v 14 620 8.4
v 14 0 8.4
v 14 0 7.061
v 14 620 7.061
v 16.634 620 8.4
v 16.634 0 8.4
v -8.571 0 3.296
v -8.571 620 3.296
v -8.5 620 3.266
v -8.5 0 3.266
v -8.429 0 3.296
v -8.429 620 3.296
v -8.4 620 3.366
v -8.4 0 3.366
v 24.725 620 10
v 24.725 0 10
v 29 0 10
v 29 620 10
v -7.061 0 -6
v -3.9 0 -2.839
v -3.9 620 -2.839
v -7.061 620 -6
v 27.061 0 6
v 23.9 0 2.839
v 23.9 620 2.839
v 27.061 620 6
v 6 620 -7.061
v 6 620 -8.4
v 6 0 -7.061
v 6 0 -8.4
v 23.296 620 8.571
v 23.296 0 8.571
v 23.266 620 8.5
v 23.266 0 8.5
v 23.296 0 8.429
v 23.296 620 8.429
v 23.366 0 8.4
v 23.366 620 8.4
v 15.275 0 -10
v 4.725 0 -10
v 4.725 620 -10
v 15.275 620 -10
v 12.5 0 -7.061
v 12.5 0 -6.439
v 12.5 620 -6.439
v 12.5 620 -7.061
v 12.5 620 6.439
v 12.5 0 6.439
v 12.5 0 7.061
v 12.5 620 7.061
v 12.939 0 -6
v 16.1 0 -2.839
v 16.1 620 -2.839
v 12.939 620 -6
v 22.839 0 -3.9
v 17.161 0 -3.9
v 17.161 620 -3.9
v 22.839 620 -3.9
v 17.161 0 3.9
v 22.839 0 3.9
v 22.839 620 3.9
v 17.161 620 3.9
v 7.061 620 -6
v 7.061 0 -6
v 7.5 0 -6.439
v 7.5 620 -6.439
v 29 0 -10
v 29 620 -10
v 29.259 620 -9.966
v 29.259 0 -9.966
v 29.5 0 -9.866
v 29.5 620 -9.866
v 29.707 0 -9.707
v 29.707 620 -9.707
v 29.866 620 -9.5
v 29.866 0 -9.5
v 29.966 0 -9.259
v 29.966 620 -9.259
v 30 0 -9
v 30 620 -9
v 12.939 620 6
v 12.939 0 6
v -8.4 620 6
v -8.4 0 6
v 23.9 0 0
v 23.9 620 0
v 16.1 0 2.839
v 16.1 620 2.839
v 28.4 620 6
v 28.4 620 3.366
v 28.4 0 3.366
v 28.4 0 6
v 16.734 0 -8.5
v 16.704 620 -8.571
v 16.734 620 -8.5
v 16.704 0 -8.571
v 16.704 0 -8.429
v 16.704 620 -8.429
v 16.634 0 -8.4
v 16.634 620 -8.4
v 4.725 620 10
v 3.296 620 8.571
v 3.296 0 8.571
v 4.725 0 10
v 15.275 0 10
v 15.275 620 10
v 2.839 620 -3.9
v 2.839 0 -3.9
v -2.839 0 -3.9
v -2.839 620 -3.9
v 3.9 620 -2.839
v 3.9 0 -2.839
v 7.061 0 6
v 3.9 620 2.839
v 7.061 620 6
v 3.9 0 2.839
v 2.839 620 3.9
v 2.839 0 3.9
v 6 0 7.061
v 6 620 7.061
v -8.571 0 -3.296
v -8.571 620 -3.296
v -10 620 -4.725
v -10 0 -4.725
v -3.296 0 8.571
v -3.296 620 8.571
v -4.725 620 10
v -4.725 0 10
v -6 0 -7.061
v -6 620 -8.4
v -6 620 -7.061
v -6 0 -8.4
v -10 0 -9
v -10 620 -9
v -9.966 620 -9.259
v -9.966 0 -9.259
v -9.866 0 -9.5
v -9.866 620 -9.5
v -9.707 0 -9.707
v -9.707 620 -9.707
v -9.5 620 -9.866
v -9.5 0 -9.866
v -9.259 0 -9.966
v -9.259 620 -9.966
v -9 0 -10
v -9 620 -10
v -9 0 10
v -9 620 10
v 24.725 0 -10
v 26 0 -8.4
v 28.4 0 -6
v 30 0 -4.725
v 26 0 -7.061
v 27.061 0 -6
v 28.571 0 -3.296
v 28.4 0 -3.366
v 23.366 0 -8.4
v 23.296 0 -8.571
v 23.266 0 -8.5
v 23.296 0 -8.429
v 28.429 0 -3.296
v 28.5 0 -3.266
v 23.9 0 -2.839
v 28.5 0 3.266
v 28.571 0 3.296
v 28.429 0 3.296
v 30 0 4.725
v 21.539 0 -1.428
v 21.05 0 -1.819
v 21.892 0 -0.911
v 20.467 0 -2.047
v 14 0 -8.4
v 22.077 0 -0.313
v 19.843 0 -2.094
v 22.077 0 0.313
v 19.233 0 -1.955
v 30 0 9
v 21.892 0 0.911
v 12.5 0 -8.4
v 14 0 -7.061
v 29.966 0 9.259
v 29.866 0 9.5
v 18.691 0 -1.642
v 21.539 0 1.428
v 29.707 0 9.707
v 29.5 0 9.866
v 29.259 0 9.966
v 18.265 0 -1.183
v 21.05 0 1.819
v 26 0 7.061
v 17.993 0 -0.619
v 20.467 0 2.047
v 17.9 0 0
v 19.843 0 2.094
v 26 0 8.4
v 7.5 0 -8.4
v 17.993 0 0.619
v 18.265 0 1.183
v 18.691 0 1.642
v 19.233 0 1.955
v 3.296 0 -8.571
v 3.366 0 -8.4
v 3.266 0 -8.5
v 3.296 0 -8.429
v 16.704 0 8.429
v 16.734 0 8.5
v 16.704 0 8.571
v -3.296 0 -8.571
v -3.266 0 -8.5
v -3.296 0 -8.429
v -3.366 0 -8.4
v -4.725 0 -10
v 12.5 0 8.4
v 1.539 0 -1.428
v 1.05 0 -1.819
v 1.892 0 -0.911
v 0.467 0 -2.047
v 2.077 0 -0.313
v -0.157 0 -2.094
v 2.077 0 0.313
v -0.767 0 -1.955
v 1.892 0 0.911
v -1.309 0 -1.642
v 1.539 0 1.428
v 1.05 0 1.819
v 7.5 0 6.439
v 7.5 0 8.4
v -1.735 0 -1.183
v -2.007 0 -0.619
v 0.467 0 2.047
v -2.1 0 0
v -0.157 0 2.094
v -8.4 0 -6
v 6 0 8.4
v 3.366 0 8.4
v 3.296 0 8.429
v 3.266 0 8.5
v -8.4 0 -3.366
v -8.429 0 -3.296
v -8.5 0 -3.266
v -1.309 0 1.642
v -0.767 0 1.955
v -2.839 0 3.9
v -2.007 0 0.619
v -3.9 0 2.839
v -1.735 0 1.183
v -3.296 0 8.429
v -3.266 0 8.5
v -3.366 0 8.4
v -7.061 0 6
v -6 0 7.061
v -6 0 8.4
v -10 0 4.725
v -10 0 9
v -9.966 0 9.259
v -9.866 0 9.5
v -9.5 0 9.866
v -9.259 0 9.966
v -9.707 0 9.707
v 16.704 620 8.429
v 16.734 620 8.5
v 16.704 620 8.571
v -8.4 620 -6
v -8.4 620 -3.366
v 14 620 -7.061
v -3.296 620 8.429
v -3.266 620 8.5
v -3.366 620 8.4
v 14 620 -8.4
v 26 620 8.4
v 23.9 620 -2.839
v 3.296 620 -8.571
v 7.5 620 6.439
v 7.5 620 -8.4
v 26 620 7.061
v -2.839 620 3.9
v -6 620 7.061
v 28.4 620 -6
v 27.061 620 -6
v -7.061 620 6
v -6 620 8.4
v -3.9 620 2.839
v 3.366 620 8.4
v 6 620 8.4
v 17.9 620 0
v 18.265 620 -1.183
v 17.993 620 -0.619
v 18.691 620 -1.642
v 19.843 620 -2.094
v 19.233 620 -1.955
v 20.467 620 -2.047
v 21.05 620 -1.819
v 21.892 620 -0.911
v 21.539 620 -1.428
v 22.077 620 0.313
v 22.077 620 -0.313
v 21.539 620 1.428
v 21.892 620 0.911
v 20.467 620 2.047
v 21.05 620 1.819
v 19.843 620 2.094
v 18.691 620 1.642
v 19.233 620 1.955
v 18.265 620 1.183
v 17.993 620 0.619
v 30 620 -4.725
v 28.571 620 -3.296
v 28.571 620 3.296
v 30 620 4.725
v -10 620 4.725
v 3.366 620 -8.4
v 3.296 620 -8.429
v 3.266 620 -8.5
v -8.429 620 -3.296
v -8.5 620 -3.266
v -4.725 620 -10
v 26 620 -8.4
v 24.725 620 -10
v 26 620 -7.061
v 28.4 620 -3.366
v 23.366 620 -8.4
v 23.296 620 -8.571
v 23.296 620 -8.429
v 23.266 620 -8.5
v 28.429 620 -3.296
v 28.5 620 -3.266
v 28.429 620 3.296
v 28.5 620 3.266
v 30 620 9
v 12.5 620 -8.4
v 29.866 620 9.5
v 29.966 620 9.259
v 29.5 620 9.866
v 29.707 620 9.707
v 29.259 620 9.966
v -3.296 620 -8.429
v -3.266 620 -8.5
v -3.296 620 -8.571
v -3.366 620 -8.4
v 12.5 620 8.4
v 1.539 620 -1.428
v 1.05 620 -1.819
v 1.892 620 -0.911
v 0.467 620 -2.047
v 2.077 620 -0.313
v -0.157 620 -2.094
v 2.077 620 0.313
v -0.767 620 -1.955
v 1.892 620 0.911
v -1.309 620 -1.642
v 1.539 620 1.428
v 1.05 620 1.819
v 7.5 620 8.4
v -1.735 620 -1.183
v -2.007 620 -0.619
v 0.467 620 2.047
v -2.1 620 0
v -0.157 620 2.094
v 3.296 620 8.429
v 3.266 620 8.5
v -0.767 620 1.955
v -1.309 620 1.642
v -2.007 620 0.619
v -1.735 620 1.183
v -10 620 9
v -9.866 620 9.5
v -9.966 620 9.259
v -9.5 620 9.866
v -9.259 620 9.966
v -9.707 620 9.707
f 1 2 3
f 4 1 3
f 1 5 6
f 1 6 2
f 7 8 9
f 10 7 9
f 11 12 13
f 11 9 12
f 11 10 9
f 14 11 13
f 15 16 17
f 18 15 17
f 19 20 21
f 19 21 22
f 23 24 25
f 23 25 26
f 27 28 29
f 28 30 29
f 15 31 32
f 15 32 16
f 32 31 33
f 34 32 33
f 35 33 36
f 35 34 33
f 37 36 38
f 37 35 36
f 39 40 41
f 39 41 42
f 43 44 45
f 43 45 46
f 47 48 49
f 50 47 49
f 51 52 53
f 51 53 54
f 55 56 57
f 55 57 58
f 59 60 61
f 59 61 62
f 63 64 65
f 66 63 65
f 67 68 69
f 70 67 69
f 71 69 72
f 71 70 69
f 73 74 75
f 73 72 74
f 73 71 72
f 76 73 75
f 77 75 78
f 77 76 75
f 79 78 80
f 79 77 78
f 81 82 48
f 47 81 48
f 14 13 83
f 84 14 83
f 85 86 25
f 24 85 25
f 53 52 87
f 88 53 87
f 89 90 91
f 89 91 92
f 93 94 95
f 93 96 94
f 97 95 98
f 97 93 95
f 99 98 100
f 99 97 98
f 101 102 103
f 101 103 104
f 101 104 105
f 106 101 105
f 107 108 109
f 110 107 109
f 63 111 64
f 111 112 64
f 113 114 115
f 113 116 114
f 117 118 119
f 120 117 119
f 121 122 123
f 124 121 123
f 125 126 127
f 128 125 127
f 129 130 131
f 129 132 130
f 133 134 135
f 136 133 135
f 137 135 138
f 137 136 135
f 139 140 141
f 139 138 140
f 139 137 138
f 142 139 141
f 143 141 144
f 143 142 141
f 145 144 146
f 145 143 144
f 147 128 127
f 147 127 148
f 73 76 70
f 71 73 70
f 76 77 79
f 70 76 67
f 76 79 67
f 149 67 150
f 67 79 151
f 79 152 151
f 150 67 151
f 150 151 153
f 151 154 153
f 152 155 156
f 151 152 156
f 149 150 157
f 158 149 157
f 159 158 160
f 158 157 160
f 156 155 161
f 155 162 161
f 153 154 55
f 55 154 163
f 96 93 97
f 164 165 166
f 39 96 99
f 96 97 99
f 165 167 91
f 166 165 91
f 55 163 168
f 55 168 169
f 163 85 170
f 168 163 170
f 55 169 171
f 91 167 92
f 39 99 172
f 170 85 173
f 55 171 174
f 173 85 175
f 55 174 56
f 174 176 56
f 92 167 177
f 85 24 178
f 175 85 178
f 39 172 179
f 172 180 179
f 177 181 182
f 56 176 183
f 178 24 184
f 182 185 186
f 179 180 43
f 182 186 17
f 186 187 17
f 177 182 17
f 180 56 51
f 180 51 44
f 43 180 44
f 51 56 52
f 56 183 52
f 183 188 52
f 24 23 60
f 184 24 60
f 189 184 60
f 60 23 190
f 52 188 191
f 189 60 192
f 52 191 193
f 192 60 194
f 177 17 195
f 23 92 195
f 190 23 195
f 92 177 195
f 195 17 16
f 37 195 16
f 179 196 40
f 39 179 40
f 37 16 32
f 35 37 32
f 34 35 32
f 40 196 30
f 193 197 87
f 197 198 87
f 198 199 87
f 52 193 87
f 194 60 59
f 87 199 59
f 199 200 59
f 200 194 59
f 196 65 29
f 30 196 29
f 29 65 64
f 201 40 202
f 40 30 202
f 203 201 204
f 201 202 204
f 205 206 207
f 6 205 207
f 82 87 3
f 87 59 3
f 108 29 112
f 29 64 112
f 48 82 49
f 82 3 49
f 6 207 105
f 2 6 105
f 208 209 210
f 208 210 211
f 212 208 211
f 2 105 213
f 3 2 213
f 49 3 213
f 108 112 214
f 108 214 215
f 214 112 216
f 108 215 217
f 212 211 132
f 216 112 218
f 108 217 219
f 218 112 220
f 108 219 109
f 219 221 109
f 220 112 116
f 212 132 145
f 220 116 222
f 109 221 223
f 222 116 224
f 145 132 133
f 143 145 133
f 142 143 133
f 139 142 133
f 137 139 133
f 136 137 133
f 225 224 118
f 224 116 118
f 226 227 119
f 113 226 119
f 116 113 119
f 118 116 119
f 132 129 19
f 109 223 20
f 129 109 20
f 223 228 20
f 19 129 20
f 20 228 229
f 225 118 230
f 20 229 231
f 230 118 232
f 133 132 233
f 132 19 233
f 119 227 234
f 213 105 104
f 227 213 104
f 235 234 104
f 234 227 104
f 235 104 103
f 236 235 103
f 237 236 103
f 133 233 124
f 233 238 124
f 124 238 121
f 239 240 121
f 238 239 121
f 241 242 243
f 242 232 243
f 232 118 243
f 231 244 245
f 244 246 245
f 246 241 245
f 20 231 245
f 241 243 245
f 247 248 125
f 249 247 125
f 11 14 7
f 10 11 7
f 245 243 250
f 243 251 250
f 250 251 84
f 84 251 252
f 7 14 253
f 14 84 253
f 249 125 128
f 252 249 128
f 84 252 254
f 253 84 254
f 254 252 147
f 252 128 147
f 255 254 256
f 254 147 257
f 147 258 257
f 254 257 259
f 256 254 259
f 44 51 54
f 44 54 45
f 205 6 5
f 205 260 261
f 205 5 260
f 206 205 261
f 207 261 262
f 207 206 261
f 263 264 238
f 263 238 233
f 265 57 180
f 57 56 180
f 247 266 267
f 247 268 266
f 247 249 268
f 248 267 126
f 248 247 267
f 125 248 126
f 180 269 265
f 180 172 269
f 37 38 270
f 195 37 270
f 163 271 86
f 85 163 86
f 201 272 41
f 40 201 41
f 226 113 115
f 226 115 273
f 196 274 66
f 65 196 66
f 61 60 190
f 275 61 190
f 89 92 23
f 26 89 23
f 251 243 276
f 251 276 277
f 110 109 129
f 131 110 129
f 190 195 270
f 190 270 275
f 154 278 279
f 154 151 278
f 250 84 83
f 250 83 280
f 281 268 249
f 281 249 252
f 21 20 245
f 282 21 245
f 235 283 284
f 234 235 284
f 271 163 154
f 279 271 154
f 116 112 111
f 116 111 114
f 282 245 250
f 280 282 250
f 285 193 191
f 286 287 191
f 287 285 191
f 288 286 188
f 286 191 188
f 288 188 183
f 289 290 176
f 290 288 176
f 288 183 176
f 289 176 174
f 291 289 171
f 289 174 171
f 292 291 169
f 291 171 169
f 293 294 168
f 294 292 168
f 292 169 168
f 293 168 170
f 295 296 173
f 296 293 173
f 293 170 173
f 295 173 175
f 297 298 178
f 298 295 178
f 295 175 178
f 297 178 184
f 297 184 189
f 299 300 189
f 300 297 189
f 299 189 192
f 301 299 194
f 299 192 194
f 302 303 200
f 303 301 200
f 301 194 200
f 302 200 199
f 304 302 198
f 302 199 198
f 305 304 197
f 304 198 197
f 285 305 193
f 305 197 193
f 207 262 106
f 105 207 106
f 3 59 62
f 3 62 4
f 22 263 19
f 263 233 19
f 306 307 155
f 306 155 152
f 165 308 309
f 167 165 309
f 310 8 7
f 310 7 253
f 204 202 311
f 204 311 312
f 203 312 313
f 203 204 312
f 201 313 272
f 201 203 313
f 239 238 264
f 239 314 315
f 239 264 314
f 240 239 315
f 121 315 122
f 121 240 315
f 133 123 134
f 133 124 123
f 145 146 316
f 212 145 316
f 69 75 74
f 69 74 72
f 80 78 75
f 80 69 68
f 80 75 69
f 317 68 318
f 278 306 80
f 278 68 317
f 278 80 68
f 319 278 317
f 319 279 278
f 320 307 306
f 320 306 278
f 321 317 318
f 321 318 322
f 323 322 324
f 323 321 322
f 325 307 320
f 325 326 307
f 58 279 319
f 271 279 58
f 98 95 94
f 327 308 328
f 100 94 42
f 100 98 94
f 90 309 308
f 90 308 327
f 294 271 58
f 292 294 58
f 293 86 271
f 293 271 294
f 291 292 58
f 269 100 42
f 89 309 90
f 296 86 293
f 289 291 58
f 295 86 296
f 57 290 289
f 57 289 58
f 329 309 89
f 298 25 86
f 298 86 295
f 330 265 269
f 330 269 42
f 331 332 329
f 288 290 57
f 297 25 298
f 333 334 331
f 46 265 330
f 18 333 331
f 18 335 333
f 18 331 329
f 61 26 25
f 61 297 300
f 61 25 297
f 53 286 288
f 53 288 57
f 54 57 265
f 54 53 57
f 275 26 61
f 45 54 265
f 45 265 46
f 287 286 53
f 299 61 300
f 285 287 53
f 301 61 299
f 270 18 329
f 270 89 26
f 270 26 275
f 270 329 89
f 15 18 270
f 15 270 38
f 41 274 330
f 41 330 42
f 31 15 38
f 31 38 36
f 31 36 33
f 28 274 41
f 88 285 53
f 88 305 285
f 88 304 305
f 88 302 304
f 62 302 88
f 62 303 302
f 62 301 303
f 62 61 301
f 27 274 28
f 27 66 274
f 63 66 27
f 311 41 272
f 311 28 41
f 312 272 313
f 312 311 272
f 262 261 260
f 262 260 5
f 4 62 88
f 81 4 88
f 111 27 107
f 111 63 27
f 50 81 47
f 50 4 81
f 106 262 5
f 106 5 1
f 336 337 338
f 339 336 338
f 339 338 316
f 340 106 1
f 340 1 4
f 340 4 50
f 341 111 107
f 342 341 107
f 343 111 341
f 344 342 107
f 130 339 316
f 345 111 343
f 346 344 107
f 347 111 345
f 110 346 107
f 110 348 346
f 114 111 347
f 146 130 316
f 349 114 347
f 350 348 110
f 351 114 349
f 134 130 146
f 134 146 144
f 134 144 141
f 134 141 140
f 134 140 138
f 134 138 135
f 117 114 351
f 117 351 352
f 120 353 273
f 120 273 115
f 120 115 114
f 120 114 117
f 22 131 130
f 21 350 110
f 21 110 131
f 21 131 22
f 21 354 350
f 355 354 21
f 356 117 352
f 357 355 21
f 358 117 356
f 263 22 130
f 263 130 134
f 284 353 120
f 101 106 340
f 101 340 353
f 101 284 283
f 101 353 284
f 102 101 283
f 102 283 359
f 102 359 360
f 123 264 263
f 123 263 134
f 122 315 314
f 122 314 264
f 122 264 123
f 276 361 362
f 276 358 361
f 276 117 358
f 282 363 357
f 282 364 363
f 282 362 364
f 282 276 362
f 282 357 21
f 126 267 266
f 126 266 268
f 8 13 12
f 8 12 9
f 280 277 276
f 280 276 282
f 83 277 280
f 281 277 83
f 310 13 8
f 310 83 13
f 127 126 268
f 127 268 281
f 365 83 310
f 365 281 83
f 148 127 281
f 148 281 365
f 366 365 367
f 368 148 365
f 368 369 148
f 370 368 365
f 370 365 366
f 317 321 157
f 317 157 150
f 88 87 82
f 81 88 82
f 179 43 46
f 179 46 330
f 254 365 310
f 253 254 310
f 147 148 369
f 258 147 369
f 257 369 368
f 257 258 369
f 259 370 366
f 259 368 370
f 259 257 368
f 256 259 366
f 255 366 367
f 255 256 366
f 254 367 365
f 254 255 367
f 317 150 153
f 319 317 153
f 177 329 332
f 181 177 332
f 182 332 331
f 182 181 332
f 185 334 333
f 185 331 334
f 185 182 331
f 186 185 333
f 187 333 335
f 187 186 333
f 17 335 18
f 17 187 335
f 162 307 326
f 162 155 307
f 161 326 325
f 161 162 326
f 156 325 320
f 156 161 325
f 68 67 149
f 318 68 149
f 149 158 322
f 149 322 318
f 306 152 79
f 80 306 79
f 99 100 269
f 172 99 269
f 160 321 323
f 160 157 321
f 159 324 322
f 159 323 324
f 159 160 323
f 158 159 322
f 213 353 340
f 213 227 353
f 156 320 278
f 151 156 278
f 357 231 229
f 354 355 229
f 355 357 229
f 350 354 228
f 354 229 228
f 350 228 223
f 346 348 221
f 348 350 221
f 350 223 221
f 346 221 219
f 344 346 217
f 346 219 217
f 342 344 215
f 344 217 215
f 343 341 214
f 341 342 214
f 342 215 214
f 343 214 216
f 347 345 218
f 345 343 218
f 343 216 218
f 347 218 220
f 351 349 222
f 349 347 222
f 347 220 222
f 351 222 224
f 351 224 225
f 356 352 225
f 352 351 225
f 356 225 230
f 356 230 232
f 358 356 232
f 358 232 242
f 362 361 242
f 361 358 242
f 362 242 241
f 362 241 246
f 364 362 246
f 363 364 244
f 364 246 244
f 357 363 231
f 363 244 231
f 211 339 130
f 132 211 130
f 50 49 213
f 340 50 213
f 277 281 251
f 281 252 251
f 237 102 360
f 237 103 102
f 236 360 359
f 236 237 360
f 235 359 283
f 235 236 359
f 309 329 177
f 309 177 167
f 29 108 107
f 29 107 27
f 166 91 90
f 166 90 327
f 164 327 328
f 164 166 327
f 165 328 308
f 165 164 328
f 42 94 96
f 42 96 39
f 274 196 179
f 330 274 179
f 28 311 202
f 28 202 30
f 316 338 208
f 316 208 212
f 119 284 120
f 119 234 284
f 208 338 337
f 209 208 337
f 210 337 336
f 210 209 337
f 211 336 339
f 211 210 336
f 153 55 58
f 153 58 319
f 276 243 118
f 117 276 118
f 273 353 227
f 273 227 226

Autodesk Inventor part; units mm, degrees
ref_plane "YZ Plane" through (0, 0, 0) normal (1, 0, 0) x (0, 1, 0)
ref_plane "XZ Plane" through (0, 0, 0) normal (0, 1, 0) x (-1, 0, 0)
ref_plane "XY Plane" through (0, 0, 0) normal (0, 0, 1) x (1, 0, 0)
sketch "Sketch1" plane through (0, 0, 0) normal (0, 1, 0) x (-1, 0, 0)
  line L0 (3.9, -2.8393) -> (3.9, 2.8393)
  line L1 (2.8393, 3.9) -> (-2.8393, 3.9)
  line L2 (-2.8393, -3.9) -> (2.8393, -3.9)
  line L3 (8.5707, 3.2957) -> (10, 4.725)
  line L4 (8.5707, -3.2957) -> (10, -4.725)
  line L5 (8.4, 3.3664) -> (8.4, 6)
  line L6 (8.4, 6) -> (7.0607, 6)
  line L7 (10, 9) -> (10, 4.725)
  line L8 (10, -4.725) -> (10, -9)
  line L9 (3.9, 2.8393) -> (7.0607, 6)
  line L10 (3.2957, 8.5707) -> (4.725, 10)
  line L11 (3.3664, 8.4) -> (6, 8.4)
  line L12 (6, 8.4) -> (6, 7.0607)
  line L13 (2.8393, 3.9) -> (6, 7.0607)
  line L14 (8.4, -3.3664) -> (8.4, -6)
  line L15 (8.4, -6) -> (7.0607, -6)
  line L16 (3.9, -2.8393) -> (7.0607, -6)
  line L17 (3.2957, -8.5707) -> (4.725, -10)
  line L18 (3.3664, -8.4) -> (6, -8.4)
  line L19 (6, -8.4) -> (6, -7.0607)
  line L20 (2.8393, -3.9) -> (6, -7.0607)
  line L21 (-3.9, -2.8393) -> (-3.9, 2.8393)
  line L22 (-3.9, 2.8393) -> (-7.0607, 6)
  line L23 (-6, 8.4) -> (-6, 7.0607)
  line L24 (-2.8393, 3.9) -> (-6, 7.0607)
  line L25 (-3.9, -2.8393) -> (-7.0607, -6)
  line L26 (-2.8393, -3.9) -> (-6, -7.0607)
  line L27 (-6, -8.4) -> (-6, -7.0607)
  line L28 (-3.3664, -8.4) -> (-6, -8.4)
  line L29 (-3.2957, -8.5707) -> (-4.725, -10)
  line L30 (4.725, 10) -> (9, 10)
  line L31 (9, -10) -> (4.725, -10)
  circle A0 centre (0, 0) radius 2.1
  arc A1 (10, 9) -> (9, 10) centre (9, 9) ccw
  arc A2 (9, -10) -> (10, -9) centre (9, -9) ccw
  arc A3 (8.4, 3.3664) -> (8.5707, 3.2957) centre (8.5, 3.3664) ccw
  arc A4 (3.2957, 8.5707) -> (3.3664, 8.4) centre (3.3664, 8.5) ccw
  arc A5 (8.5707, -3.2957) -> (8.4, -3.3664) centre (8.5, -3.3664) ccw
  arc A6 (3.3664, -8.4) -> (3.2957, -8.5707) centre (3.3664, -8.5) ccw
  arc A7 (-3.2957, -8.5707) -> (-3.3664, -8.4) centre (-3.3664, -8.5) ccw
  line L32 (-23.9, -2.8393) -> (-23.9, 2.8393)
  line L33 (-22.8393, 3.9) -> (-17.1607, 3.9)
  line L34 (-17.1607, -3.9) -> (-22.8393, -3.9)
  line L35 (-28.5707, 3.2957) -> (-30, 4.725)
  line L36 (-28.5707, -3.2957) -> (-30, -4.725)
  line L37 (-28.4, 3.3664) -> (-28.4, 6)
  line L38 (-28.4, 6) -> (-27.0607, 6)
  line L39 (-30, 9) -> (-30, 4.725)
  line L40 (-30, -4.725) -> (-30, -9)
  line L41 (-23.9, 2.8393) -> (-27.0607, 6)
  line L42 (-23.2957, 8.5707) -> (-24.725, 10)
  line L43 (-23.3664, 8.4) -> (-26, 8.4)
  line L44 (-26, 8.4) -> (-26, 7.0607)
  line L45 (-22.8393, 3.9) -> (-26, 7.0607)
  line L46 (-23.9, 0) -> (-28.4, 0)
  line L47 (-23.9, -2.8393) -> (-27.0607, -6)
  line L48 (-28.4, -6) -> (-27.0607, -6)
  line L49 (-28.4, -3.3664) -> (-28.4, -6)
  line L50 (-22.8393, -3.9) -> (-26, -7.0607)
  line L51 (-26, -8.4) -> (-26, -7.0607)
  line L52 (-23.3664, -8.4) -> (-26, -8.4)
  line L53 (-23.2957, -8.5707) -> (-24.725, -10)
  line L54 (-16.1, -2.8393) -> (-12.9393, -6)
  line L55 (-17.1607, -3.9) -> (-14, -7.0607)
  line L56 (-16.6336, -8.4) -> (-14, -8.4)
  line L57 (-16.1, -2.8393) -> (-16.1, 2.8393)
  line L58 (-16.1, 2.8393) -> (-12.9393, 6)
  line L59 (-17.1607, 3.9) -> (-14, 7.0607)
  line L60 (-14, 8.4) -> (-14, 7.0607)
  line L61 (-14, -8.4) -> (-14, -7.0607)
  line L62 (-16.7043, -8.5707) -> (-15.275, -10)
  line L63 (-24.725, 10) -> (-29, 10)
  line L64 (-29, -10) -> (-24.725, -10)
  circle A8 centre (-20, 0) radius 2.1
  arc A9 (-29, 10) -> (-30, 9) centre (-29, 9) ccw
  arc A10 (-30, -9) -> (-29, -10) centre (-29, -9) ccw
  arc A11 (-28.5707, 3.2957) -> (-28.4, 3.3664) centre (-28.5, 3.3664) ccw
  arc A12 (-23.3664, 8.4) -> (-23.2957, 8.5707) centre (-23.3664, 8.5) ccw
  arc A13 (-28.4, -3.3664) -> (-28.5707, -3.2957) centre (-28.5, -3.3664) ccw
  arc A14 (-23.2957, -8.5707) -> (-23.3664, -8.4) centre (-23.3664, -8.5) ccw
  arc A15 (-16.6336, -8.4) -> (-16.7043, -8.5707) centre (-16.6336, -8.5) ccw
  arc A16 (-16.7043, 8.5707) -> (-16.6336, 8.4) centre (-16.6336, 8.5) ccw
  line L65 (-7.5, -8.4) -> (-7.5, -6.4393)
  line L66 (-7.0607, -6) -> (-7.5, -6.4393)
  line L67 (-12.5, -7.0607) -> (-12.5, -8.4)
  line L68 (-12.9393, -6) -> (-12.5, -6.4393)
  line L69 (-12.5, -6.4393) -> (-12.5, -7.0607)
  line L70 (-7.5, -8.4) -> (-12.5, -8.4)
  line L71 (-4.725, -10) -> (-15.275, -10)
  line L72 (-3.9, 2.8393) -> (-7.0607, 6)
  line L73 (-2.8393, 3.9) -> (-6, 7.0607)
  line L74 (-3.3664, 8.4) -> (-6, 8.4)
  line L75 (-6, 8.4) -> (-6, 7.0607)
  line L76 (-3.2957, 8.5707) -> (-4.725, 10)
  arc A17 (-3.3664, 8.4) -> (-3.2957, 8.5707) centre (-3.3664, 8.5) ccw
  line L77 (-16.1, 2.8393) -> (-12.9393, 6)
  line L78 (-17.1607, 3.9) -> (-14, 7.0607)
  line L79 (-16.6336, 8.4) -> (-14, 8.4)
  line L80 (-14, 8.4) -> (-14, 7.0607)
  line L81 (-16.7043, 8.5707) -> (-15.275, 10)
  arc A18 (-16.7043, 8.5707) -> (-16.6336, 8.4) centre (-16.6336, 8.5) ccw
  line L82 (-7.5, 8.4) -> (-7.5, 6.4393)
  line L83 (-7.0607, 6) -> (-7.5, 6.4393)
  line L84 (-12.5, 7.0607) -> (-12.5, 8.4)
  line L85 (-12.9393, 6) -> (-12.5, 6.4393)
  line L86 (-12.5, 6.4393) -> (-12.5, 7.0607)
  line L87 (-7.5, 8.4) -> (-12.5, 8.4)
  line L88 (-4.725, 10) -> (-15.275, 10)
extrude "Extrusion1" add sketch "Sketch1" along normal blind 620
properties part number "VSLOT20x40x620"
